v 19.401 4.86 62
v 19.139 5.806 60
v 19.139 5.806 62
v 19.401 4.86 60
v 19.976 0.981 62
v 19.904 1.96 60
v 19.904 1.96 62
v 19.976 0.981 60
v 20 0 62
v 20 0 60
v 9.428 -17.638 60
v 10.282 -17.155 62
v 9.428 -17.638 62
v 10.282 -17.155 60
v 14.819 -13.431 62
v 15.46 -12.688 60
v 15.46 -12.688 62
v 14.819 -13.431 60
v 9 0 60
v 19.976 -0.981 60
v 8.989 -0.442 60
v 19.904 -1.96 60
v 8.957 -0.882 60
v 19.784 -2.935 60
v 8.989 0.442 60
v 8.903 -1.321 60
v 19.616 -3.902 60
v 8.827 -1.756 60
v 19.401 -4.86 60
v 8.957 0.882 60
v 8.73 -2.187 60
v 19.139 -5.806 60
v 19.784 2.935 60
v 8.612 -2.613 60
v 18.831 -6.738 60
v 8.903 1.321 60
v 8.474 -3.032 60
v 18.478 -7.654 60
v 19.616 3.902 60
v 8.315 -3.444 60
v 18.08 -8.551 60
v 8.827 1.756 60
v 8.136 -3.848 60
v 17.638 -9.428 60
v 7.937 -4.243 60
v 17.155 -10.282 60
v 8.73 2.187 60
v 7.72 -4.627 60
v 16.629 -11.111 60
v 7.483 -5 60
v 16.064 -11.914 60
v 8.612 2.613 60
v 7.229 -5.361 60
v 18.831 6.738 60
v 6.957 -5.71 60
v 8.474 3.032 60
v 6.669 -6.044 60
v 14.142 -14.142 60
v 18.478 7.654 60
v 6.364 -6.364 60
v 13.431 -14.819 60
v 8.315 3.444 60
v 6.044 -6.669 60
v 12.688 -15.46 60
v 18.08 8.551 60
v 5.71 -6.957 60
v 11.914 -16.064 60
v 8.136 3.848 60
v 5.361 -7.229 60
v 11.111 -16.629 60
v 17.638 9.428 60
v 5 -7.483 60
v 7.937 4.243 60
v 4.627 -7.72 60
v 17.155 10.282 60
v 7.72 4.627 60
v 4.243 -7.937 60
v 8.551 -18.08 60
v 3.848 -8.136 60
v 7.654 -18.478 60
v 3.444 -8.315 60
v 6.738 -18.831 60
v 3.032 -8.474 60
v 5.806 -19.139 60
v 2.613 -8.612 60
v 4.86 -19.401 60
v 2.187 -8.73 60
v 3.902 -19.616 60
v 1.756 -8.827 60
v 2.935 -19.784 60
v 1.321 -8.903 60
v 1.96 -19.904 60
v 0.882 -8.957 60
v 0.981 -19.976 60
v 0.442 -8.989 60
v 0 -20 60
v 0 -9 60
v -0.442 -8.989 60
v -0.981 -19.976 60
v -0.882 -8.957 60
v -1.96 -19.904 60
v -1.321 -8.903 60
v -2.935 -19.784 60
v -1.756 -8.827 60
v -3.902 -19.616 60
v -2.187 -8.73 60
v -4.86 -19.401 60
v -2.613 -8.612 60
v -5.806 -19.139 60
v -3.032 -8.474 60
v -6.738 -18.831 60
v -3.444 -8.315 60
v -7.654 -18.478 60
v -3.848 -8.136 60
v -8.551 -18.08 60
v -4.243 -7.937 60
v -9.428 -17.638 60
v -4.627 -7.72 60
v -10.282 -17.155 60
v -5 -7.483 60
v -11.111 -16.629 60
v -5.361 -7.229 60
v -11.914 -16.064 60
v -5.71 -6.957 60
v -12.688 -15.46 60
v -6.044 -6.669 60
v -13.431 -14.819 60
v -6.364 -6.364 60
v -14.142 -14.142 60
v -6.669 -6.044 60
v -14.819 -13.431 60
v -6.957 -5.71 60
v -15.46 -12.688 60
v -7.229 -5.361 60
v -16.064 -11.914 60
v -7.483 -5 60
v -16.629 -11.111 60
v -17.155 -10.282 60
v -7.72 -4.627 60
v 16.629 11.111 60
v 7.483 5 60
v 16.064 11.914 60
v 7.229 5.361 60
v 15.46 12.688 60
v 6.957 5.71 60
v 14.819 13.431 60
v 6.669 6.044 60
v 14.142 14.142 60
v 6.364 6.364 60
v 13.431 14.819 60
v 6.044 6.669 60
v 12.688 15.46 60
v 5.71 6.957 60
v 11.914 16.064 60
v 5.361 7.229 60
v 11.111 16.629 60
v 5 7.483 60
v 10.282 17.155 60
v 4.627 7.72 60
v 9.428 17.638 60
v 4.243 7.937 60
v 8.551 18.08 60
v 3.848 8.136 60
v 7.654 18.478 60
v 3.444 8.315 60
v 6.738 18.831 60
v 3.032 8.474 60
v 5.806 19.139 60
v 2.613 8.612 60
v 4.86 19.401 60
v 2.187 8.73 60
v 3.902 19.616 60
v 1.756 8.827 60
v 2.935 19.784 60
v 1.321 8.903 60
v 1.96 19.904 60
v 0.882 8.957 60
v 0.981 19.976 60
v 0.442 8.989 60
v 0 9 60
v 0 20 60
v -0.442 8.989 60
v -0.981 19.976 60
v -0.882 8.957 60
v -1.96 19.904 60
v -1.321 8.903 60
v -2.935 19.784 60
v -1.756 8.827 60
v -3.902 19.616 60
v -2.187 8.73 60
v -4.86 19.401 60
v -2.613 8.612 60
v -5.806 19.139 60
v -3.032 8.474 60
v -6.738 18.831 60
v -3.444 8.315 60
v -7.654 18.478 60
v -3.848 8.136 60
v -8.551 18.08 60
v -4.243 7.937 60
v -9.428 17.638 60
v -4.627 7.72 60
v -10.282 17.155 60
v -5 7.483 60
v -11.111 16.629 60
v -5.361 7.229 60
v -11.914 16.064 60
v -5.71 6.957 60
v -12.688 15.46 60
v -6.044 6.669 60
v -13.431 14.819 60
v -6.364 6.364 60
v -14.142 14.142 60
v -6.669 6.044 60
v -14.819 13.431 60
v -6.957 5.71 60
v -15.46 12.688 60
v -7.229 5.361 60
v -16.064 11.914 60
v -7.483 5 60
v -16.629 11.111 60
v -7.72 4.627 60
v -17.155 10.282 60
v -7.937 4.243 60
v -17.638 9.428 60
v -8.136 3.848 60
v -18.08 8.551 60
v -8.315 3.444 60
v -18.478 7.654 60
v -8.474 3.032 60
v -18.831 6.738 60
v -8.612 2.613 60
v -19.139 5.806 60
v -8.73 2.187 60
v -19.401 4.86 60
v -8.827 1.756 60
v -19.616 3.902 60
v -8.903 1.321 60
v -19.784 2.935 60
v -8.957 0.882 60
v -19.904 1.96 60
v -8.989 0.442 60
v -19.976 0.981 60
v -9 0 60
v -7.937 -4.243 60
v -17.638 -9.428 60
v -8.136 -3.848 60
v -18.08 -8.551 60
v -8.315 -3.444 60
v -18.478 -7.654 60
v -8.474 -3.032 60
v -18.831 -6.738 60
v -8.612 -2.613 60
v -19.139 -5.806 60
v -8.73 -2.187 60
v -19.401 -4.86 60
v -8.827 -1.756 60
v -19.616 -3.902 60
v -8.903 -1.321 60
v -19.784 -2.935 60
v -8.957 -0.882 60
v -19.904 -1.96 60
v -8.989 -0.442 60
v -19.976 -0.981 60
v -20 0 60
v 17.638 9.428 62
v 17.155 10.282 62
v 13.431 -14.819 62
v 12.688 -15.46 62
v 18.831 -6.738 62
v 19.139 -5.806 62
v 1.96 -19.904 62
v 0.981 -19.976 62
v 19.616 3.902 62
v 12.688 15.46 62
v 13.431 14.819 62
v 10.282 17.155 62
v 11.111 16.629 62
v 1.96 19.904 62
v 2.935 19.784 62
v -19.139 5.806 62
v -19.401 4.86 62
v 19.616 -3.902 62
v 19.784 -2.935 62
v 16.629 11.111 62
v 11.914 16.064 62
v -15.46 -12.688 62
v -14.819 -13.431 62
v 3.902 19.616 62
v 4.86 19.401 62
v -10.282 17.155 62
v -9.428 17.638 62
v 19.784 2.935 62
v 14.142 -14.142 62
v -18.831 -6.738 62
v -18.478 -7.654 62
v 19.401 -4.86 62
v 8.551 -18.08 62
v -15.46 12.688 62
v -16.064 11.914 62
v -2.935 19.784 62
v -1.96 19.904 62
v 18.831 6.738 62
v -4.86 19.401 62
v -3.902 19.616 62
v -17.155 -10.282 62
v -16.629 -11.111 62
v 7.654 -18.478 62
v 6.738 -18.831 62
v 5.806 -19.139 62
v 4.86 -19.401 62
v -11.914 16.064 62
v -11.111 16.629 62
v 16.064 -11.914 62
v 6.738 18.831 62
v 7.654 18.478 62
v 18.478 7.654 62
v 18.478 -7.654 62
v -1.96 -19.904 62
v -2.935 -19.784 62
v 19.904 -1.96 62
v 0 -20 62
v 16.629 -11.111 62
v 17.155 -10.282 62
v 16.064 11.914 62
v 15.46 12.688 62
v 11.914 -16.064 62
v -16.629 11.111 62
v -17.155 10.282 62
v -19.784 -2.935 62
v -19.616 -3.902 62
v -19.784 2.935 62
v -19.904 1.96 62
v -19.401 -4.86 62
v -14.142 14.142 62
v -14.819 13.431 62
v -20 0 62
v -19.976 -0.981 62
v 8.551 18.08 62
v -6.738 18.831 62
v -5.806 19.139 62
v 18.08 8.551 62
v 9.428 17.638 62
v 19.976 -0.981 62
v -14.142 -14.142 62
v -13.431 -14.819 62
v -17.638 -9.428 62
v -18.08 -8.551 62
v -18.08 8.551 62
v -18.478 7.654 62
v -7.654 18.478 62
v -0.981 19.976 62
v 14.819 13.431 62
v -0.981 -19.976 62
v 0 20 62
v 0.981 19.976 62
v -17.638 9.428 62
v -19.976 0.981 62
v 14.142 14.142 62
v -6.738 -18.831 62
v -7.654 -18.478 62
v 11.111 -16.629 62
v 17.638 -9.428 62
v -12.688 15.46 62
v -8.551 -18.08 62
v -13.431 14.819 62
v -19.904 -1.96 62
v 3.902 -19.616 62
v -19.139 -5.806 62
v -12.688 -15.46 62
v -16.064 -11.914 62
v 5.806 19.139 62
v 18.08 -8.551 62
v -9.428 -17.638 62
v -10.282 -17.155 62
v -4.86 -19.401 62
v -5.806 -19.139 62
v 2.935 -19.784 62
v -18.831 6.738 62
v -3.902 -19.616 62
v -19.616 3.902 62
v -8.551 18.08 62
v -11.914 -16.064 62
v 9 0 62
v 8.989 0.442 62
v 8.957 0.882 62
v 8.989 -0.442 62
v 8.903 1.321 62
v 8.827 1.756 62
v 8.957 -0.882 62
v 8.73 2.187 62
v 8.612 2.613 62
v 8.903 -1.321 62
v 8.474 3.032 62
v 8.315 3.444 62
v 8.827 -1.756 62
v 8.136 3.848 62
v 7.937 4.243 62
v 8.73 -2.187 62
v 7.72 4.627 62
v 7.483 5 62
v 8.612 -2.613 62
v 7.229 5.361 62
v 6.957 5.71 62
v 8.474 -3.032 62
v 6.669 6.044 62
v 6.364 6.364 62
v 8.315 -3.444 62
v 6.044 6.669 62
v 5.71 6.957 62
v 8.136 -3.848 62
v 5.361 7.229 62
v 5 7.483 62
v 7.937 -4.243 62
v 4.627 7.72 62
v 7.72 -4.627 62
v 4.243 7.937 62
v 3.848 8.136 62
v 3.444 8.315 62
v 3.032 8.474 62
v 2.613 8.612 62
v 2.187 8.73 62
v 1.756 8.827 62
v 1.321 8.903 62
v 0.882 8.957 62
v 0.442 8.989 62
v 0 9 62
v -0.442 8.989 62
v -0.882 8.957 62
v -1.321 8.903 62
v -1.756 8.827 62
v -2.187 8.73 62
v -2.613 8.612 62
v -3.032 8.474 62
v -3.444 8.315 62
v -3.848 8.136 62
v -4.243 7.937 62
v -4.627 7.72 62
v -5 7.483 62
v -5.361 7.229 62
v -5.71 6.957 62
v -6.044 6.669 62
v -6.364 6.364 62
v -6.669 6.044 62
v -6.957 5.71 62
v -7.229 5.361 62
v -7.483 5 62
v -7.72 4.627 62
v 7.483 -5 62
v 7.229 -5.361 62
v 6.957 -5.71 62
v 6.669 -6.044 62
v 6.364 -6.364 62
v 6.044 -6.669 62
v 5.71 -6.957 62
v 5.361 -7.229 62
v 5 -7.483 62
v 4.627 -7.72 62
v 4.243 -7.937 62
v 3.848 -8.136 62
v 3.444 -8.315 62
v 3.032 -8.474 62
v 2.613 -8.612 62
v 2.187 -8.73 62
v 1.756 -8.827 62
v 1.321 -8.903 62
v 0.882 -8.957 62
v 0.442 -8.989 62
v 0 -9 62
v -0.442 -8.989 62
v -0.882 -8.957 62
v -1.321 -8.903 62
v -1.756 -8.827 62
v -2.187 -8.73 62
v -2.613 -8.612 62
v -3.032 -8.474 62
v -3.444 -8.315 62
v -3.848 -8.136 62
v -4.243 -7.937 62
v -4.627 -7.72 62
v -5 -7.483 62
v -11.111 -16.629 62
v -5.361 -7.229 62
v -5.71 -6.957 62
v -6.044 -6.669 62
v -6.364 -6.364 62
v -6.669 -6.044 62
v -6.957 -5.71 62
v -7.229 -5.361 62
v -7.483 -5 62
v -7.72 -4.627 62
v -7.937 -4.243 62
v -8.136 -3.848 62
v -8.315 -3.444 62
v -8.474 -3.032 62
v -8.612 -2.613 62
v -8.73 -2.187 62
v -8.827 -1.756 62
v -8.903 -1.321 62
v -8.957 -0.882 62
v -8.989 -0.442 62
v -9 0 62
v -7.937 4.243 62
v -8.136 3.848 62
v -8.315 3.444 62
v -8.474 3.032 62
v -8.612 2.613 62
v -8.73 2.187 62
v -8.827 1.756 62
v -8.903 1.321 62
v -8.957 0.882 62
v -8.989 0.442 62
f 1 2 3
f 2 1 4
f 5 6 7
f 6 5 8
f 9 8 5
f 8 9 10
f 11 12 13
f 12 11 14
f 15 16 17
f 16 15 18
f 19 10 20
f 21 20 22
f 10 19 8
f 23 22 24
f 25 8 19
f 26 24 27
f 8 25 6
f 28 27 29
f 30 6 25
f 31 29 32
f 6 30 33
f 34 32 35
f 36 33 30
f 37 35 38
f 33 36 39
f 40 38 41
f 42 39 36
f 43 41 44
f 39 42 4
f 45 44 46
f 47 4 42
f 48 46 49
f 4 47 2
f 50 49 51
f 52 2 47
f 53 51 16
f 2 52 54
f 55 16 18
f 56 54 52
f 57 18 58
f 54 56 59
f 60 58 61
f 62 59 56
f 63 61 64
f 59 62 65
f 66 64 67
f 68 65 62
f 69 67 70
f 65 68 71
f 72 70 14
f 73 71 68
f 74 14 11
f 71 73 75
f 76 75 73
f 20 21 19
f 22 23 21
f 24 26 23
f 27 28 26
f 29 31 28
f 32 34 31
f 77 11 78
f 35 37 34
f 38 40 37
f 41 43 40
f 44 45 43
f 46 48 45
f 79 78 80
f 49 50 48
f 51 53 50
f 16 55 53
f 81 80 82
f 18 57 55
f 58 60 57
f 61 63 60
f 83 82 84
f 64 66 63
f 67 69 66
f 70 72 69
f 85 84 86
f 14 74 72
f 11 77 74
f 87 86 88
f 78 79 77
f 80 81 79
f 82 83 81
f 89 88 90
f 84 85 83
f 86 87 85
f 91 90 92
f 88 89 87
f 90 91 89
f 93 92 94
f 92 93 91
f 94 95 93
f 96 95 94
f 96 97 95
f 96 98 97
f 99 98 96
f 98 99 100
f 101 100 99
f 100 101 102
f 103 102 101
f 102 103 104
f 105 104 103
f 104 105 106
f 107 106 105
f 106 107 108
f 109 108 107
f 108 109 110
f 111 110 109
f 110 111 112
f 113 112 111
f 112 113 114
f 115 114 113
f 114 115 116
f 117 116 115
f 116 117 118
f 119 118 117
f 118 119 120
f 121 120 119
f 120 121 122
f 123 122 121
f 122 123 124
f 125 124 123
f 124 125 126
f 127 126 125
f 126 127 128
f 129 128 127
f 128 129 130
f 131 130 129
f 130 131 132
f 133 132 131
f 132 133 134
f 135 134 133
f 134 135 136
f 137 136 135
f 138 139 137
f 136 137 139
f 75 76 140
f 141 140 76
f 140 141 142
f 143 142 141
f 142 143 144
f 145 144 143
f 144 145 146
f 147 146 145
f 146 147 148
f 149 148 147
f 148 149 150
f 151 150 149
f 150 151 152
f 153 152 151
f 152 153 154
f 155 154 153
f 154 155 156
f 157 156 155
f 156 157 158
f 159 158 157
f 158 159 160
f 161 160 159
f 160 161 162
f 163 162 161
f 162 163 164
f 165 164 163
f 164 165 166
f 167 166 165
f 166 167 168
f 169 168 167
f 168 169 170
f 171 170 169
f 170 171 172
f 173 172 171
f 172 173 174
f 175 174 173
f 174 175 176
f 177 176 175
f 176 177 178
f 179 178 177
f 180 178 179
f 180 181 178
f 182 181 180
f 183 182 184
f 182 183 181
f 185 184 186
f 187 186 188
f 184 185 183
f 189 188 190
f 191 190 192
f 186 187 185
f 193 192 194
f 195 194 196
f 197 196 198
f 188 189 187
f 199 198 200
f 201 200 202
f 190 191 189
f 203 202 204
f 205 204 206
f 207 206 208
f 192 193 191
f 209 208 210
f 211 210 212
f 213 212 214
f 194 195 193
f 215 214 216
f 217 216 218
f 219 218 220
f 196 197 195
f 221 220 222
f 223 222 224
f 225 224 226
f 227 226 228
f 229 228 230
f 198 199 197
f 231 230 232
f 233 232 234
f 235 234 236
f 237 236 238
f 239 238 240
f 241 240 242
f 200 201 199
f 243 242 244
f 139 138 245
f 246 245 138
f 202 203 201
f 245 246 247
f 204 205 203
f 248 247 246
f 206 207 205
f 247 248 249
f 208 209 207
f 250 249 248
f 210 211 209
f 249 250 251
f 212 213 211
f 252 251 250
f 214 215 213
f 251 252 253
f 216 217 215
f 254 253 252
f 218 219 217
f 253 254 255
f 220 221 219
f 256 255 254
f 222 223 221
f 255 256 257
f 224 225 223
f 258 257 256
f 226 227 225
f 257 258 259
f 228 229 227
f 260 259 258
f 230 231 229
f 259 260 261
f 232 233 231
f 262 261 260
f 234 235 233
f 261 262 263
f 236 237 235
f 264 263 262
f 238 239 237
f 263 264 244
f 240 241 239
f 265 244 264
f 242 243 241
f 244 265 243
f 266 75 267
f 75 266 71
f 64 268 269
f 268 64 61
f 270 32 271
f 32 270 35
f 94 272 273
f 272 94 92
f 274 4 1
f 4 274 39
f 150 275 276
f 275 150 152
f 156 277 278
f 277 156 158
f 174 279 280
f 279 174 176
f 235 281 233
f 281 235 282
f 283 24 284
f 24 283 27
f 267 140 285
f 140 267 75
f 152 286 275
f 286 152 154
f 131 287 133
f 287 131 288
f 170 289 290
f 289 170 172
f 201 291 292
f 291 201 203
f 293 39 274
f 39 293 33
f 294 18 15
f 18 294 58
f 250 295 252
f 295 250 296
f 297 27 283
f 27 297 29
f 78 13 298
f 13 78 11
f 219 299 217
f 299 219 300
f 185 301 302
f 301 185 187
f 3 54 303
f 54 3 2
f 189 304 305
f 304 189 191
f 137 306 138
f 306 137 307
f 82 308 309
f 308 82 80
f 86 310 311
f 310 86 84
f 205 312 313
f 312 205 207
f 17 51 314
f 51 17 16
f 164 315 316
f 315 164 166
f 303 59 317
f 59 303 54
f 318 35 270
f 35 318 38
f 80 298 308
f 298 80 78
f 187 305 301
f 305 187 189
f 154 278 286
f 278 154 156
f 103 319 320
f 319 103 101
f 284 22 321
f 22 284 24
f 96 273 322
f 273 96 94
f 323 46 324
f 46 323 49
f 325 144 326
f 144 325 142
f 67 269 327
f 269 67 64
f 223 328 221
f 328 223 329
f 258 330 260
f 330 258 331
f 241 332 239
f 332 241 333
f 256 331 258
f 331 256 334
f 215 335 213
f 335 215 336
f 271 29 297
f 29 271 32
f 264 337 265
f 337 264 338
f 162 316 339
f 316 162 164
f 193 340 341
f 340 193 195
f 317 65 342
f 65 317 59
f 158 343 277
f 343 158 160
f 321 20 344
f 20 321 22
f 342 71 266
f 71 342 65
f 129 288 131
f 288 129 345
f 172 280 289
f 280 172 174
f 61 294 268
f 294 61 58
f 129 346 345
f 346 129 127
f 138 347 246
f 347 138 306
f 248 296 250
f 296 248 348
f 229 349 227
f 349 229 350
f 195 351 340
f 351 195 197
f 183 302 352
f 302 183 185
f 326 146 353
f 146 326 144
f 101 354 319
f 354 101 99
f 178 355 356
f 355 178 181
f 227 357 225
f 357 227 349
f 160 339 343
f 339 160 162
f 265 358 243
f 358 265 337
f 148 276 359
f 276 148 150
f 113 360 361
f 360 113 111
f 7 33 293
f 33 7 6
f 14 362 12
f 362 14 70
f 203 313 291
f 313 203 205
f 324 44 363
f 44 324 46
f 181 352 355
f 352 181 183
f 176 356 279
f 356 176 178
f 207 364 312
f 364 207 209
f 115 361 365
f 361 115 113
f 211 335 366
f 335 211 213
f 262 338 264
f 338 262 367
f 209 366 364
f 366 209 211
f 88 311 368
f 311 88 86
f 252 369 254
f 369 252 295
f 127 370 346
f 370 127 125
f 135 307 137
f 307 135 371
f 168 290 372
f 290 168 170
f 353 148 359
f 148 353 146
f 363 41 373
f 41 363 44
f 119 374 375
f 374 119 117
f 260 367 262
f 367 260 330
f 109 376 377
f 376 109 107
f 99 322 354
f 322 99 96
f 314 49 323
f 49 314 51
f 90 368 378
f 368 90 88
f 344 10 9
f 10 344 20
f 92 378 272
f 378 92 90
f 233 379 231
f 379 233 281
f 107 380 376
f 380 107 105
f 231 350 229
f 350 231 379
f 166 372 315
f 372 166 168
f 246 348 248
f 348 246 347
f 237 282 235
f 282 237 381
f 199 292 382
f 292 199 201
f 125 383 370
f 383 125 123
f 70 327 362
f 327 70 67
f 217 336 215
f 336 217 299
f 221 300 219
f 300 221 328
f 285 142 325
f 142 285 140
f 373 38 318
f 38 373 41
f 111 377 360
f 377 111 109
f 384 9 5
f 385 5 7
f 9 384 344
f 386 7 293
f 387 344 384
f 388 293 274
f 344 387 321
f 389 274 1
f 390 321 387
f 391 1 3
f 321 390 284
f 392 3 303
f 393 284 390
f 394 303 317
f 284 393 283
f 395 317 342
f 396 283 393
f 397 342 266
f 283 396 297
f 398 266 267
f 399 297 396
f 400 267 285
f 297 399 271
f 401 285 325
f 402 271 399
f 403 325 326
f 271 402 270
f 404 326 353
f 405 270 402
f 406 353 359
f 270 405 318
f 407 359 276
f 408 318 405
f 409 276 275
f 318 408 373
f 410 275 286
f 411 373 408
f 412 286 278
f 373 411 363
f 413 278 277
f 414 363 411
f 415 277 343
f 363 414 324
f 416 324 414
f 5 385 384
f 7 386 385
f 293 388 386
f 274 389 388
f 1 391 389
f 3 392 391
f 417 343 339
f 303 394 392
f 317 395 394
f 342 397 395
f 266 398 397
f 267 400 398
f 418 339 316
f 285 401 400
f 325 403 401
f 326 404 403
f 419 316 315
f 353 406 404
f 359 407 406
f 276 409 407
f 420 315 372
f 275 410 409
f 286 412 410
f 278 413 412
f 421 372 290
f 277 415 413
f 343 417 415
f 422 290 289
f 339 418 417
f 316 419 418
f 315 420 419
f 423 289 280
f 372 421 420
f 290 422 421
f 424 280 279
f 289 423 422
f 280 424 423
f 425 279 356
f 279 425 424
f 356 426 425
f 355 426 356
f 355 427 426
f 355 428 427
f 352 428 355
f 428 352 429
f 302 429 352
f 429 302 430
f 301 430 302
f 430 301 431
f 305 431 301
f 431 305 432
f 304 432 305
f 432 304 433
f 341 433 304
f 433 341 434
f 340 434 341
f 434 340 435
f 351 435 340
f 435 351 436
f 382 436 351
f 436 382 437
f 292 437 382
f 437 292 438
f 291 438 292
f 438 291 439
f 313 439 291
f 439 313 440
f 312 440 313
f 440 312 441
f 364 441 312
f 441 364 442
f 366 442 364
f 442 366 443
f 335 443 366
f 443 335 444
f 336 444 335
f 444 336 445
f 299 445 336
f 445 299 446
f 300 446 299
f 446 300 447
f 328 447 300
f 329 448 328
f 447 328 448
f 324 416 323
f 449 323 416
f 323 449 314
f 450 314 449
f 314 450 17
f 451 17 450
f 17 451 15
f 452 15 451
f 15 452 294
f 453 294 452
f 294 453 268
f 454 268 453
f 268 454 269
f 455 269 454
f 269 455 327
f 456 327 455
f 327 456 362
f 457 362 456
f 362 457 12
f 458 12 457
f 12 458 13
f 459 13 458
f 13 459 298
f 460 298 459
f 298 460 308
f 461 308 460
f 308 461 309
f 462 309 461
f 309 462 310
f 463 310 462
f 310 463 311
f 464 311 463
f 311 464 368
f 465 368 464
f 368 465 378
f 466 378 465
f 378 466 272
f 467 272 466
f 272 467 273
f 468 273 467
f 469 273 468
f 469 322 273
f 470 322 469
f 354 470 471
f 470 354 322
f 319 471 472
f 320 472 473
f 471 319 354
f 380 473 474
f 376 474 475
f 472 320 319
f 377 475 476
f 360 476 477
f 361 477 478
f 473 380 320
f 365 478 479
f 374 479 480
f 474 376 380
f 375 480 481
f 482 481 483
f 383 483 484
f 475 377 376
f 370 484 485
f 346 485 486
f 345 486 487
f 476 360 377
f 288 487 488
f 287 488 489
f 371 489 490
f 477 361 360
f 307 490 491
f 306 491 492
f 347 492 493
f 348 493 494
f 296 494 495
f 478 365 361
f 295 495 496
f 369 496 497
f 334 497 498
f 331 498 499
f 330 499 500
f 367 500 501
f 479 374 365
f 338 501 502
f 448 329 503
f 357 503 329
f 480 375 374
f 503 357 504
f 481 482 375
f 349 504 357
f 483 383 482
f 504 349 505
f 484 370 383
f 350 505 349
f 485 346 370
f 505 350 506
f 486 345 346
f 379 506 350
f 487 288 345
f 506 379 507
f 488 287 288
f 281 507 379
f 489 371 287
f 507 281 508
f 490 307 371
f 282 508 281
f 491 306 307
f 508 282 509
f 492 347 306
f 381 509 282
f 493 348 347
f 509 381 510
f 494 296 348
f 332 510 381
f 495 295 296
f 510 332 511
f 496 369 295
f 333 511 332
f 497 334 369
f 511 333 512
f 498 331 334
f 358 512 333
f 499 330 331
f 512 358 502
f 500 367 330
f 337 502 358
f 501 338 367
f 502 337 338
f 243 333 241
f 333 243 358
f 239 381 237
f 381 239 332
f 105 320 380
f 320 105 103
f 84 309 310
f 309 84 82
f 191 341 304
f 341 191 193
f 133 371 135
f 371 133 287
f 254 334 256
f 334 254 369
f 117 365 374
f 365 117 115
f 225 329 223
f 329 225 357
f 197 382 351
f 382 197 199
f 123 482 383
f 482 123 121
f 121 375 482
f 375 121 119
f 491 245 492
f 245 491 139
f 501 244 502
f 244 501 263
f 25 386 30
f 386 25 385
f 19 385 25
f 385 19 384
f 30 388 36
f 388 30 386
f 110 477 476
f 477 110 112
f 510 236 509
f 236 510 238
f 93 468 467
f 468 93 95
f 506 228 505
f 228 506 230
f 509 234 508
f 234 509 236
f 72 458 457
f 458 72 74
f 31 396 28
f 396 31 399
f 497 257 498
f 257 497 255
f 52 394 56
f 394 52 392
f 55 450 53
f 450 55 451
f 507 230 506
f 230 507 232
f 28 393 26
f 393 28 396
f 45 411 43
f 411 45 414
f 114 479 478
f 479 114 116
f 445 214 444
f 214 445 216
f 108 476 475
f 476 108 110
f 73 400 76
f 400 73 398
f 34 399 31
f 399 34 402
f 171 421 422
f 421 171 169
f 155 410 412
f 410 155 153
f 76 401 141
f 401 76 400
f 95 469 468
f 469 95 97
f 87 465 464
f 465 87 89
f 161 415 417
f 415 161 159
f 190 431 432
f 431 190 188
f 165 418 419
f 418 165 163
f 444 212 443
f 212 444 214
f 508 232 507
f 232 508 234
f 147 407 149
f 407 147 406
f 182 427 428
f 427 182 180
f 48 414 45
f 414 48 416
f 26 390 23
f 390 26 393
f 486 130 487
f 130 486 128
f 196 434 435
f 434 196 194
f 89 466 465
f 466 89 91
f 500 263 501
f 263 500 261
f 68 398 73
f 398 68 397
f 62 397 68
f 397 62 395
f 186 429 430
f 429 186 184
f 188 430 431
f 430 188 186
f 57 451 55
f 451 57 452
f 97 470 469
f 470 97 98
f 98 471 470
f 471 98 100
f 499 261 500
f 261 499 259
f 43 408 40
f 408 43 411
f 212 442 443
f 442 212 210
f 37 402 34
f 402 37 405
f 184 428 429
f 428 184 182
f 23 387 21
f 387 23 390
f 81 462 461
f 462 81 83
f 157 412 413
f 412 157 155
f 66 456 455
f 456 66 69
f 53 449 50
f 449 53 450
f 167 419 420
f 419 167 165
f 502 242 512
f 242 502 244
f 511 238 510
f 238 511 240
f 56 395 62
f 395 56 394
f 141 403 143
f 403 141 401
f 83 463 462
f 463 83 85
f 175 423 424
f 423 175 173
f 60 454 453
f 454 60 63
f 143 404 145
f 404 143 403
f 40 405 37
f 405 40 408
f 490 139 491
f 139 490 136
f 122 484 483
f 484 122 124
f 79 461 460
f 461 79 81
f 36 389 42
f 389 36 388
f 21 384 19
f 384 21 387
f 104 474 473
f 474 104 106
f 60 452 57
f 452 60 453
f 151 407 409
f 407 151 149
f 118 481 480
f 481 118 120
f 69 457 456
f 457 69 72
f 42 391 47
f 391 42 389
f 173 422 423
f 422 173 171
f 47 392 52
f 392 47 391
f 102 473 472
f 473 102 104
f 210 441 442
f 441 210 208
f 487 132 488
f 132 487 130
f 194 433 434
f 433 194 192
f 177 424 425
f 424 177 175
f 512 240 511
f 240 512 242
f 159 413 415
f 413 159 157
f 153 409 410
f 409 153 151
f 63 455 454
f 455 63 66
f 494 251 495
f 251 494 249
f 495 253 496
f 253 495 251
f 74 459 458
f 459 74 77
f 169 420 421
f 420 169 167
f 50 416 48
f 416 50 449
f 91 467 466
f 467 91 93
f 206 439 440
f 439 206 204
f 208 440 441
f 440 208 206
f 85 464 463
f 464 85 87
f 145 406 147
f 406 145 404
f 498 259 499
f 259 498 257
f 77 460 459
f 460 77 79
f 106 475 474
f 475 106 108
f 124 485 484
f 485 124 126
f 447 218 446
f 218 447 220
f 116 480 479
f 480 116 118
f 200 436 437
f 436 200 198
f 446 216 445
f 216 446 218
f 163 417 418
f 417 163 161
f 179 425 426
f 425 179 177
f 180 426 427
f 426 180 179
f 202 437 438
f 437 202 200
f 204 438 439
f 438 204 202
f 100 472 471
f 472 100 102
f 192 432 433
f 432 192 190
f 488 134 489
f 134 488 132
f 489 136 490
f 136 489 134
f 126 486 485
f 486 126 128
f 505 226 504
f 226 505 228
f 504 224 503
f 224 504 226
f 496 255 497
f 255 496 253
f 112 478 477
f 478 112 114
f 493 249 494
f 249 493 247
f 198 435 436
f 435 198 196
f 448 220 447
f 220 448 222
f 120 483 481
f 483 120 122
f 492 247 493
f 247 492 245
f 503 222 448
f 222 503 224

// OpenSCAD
// file: common_params.scad
cylinder_radius = 20.000000;
cylinder_height = 60.000000;
wall_thickness = 2.000000;

cap_thickness = 2.000000;

rod_radius = 2.000000;
rod_height = 50.000000;

ring_outer_radius = 8.000000;
ring_inner_radius = 4.000000;
ring_thickness = 3.000000;
ring_z = 40.000000;

$fn = 128;
// main file
include <common_params.scad>;

hole_radius = 9.000000;

translate([0, 0, cylinder_height])
difference() {
    cylinder(h = cap_thickness, r = cylinder_radius);
    translate([0, 0, -0.1])
        cylinder(h = cap_thickness + 0.2, r = hole_radius);
}
